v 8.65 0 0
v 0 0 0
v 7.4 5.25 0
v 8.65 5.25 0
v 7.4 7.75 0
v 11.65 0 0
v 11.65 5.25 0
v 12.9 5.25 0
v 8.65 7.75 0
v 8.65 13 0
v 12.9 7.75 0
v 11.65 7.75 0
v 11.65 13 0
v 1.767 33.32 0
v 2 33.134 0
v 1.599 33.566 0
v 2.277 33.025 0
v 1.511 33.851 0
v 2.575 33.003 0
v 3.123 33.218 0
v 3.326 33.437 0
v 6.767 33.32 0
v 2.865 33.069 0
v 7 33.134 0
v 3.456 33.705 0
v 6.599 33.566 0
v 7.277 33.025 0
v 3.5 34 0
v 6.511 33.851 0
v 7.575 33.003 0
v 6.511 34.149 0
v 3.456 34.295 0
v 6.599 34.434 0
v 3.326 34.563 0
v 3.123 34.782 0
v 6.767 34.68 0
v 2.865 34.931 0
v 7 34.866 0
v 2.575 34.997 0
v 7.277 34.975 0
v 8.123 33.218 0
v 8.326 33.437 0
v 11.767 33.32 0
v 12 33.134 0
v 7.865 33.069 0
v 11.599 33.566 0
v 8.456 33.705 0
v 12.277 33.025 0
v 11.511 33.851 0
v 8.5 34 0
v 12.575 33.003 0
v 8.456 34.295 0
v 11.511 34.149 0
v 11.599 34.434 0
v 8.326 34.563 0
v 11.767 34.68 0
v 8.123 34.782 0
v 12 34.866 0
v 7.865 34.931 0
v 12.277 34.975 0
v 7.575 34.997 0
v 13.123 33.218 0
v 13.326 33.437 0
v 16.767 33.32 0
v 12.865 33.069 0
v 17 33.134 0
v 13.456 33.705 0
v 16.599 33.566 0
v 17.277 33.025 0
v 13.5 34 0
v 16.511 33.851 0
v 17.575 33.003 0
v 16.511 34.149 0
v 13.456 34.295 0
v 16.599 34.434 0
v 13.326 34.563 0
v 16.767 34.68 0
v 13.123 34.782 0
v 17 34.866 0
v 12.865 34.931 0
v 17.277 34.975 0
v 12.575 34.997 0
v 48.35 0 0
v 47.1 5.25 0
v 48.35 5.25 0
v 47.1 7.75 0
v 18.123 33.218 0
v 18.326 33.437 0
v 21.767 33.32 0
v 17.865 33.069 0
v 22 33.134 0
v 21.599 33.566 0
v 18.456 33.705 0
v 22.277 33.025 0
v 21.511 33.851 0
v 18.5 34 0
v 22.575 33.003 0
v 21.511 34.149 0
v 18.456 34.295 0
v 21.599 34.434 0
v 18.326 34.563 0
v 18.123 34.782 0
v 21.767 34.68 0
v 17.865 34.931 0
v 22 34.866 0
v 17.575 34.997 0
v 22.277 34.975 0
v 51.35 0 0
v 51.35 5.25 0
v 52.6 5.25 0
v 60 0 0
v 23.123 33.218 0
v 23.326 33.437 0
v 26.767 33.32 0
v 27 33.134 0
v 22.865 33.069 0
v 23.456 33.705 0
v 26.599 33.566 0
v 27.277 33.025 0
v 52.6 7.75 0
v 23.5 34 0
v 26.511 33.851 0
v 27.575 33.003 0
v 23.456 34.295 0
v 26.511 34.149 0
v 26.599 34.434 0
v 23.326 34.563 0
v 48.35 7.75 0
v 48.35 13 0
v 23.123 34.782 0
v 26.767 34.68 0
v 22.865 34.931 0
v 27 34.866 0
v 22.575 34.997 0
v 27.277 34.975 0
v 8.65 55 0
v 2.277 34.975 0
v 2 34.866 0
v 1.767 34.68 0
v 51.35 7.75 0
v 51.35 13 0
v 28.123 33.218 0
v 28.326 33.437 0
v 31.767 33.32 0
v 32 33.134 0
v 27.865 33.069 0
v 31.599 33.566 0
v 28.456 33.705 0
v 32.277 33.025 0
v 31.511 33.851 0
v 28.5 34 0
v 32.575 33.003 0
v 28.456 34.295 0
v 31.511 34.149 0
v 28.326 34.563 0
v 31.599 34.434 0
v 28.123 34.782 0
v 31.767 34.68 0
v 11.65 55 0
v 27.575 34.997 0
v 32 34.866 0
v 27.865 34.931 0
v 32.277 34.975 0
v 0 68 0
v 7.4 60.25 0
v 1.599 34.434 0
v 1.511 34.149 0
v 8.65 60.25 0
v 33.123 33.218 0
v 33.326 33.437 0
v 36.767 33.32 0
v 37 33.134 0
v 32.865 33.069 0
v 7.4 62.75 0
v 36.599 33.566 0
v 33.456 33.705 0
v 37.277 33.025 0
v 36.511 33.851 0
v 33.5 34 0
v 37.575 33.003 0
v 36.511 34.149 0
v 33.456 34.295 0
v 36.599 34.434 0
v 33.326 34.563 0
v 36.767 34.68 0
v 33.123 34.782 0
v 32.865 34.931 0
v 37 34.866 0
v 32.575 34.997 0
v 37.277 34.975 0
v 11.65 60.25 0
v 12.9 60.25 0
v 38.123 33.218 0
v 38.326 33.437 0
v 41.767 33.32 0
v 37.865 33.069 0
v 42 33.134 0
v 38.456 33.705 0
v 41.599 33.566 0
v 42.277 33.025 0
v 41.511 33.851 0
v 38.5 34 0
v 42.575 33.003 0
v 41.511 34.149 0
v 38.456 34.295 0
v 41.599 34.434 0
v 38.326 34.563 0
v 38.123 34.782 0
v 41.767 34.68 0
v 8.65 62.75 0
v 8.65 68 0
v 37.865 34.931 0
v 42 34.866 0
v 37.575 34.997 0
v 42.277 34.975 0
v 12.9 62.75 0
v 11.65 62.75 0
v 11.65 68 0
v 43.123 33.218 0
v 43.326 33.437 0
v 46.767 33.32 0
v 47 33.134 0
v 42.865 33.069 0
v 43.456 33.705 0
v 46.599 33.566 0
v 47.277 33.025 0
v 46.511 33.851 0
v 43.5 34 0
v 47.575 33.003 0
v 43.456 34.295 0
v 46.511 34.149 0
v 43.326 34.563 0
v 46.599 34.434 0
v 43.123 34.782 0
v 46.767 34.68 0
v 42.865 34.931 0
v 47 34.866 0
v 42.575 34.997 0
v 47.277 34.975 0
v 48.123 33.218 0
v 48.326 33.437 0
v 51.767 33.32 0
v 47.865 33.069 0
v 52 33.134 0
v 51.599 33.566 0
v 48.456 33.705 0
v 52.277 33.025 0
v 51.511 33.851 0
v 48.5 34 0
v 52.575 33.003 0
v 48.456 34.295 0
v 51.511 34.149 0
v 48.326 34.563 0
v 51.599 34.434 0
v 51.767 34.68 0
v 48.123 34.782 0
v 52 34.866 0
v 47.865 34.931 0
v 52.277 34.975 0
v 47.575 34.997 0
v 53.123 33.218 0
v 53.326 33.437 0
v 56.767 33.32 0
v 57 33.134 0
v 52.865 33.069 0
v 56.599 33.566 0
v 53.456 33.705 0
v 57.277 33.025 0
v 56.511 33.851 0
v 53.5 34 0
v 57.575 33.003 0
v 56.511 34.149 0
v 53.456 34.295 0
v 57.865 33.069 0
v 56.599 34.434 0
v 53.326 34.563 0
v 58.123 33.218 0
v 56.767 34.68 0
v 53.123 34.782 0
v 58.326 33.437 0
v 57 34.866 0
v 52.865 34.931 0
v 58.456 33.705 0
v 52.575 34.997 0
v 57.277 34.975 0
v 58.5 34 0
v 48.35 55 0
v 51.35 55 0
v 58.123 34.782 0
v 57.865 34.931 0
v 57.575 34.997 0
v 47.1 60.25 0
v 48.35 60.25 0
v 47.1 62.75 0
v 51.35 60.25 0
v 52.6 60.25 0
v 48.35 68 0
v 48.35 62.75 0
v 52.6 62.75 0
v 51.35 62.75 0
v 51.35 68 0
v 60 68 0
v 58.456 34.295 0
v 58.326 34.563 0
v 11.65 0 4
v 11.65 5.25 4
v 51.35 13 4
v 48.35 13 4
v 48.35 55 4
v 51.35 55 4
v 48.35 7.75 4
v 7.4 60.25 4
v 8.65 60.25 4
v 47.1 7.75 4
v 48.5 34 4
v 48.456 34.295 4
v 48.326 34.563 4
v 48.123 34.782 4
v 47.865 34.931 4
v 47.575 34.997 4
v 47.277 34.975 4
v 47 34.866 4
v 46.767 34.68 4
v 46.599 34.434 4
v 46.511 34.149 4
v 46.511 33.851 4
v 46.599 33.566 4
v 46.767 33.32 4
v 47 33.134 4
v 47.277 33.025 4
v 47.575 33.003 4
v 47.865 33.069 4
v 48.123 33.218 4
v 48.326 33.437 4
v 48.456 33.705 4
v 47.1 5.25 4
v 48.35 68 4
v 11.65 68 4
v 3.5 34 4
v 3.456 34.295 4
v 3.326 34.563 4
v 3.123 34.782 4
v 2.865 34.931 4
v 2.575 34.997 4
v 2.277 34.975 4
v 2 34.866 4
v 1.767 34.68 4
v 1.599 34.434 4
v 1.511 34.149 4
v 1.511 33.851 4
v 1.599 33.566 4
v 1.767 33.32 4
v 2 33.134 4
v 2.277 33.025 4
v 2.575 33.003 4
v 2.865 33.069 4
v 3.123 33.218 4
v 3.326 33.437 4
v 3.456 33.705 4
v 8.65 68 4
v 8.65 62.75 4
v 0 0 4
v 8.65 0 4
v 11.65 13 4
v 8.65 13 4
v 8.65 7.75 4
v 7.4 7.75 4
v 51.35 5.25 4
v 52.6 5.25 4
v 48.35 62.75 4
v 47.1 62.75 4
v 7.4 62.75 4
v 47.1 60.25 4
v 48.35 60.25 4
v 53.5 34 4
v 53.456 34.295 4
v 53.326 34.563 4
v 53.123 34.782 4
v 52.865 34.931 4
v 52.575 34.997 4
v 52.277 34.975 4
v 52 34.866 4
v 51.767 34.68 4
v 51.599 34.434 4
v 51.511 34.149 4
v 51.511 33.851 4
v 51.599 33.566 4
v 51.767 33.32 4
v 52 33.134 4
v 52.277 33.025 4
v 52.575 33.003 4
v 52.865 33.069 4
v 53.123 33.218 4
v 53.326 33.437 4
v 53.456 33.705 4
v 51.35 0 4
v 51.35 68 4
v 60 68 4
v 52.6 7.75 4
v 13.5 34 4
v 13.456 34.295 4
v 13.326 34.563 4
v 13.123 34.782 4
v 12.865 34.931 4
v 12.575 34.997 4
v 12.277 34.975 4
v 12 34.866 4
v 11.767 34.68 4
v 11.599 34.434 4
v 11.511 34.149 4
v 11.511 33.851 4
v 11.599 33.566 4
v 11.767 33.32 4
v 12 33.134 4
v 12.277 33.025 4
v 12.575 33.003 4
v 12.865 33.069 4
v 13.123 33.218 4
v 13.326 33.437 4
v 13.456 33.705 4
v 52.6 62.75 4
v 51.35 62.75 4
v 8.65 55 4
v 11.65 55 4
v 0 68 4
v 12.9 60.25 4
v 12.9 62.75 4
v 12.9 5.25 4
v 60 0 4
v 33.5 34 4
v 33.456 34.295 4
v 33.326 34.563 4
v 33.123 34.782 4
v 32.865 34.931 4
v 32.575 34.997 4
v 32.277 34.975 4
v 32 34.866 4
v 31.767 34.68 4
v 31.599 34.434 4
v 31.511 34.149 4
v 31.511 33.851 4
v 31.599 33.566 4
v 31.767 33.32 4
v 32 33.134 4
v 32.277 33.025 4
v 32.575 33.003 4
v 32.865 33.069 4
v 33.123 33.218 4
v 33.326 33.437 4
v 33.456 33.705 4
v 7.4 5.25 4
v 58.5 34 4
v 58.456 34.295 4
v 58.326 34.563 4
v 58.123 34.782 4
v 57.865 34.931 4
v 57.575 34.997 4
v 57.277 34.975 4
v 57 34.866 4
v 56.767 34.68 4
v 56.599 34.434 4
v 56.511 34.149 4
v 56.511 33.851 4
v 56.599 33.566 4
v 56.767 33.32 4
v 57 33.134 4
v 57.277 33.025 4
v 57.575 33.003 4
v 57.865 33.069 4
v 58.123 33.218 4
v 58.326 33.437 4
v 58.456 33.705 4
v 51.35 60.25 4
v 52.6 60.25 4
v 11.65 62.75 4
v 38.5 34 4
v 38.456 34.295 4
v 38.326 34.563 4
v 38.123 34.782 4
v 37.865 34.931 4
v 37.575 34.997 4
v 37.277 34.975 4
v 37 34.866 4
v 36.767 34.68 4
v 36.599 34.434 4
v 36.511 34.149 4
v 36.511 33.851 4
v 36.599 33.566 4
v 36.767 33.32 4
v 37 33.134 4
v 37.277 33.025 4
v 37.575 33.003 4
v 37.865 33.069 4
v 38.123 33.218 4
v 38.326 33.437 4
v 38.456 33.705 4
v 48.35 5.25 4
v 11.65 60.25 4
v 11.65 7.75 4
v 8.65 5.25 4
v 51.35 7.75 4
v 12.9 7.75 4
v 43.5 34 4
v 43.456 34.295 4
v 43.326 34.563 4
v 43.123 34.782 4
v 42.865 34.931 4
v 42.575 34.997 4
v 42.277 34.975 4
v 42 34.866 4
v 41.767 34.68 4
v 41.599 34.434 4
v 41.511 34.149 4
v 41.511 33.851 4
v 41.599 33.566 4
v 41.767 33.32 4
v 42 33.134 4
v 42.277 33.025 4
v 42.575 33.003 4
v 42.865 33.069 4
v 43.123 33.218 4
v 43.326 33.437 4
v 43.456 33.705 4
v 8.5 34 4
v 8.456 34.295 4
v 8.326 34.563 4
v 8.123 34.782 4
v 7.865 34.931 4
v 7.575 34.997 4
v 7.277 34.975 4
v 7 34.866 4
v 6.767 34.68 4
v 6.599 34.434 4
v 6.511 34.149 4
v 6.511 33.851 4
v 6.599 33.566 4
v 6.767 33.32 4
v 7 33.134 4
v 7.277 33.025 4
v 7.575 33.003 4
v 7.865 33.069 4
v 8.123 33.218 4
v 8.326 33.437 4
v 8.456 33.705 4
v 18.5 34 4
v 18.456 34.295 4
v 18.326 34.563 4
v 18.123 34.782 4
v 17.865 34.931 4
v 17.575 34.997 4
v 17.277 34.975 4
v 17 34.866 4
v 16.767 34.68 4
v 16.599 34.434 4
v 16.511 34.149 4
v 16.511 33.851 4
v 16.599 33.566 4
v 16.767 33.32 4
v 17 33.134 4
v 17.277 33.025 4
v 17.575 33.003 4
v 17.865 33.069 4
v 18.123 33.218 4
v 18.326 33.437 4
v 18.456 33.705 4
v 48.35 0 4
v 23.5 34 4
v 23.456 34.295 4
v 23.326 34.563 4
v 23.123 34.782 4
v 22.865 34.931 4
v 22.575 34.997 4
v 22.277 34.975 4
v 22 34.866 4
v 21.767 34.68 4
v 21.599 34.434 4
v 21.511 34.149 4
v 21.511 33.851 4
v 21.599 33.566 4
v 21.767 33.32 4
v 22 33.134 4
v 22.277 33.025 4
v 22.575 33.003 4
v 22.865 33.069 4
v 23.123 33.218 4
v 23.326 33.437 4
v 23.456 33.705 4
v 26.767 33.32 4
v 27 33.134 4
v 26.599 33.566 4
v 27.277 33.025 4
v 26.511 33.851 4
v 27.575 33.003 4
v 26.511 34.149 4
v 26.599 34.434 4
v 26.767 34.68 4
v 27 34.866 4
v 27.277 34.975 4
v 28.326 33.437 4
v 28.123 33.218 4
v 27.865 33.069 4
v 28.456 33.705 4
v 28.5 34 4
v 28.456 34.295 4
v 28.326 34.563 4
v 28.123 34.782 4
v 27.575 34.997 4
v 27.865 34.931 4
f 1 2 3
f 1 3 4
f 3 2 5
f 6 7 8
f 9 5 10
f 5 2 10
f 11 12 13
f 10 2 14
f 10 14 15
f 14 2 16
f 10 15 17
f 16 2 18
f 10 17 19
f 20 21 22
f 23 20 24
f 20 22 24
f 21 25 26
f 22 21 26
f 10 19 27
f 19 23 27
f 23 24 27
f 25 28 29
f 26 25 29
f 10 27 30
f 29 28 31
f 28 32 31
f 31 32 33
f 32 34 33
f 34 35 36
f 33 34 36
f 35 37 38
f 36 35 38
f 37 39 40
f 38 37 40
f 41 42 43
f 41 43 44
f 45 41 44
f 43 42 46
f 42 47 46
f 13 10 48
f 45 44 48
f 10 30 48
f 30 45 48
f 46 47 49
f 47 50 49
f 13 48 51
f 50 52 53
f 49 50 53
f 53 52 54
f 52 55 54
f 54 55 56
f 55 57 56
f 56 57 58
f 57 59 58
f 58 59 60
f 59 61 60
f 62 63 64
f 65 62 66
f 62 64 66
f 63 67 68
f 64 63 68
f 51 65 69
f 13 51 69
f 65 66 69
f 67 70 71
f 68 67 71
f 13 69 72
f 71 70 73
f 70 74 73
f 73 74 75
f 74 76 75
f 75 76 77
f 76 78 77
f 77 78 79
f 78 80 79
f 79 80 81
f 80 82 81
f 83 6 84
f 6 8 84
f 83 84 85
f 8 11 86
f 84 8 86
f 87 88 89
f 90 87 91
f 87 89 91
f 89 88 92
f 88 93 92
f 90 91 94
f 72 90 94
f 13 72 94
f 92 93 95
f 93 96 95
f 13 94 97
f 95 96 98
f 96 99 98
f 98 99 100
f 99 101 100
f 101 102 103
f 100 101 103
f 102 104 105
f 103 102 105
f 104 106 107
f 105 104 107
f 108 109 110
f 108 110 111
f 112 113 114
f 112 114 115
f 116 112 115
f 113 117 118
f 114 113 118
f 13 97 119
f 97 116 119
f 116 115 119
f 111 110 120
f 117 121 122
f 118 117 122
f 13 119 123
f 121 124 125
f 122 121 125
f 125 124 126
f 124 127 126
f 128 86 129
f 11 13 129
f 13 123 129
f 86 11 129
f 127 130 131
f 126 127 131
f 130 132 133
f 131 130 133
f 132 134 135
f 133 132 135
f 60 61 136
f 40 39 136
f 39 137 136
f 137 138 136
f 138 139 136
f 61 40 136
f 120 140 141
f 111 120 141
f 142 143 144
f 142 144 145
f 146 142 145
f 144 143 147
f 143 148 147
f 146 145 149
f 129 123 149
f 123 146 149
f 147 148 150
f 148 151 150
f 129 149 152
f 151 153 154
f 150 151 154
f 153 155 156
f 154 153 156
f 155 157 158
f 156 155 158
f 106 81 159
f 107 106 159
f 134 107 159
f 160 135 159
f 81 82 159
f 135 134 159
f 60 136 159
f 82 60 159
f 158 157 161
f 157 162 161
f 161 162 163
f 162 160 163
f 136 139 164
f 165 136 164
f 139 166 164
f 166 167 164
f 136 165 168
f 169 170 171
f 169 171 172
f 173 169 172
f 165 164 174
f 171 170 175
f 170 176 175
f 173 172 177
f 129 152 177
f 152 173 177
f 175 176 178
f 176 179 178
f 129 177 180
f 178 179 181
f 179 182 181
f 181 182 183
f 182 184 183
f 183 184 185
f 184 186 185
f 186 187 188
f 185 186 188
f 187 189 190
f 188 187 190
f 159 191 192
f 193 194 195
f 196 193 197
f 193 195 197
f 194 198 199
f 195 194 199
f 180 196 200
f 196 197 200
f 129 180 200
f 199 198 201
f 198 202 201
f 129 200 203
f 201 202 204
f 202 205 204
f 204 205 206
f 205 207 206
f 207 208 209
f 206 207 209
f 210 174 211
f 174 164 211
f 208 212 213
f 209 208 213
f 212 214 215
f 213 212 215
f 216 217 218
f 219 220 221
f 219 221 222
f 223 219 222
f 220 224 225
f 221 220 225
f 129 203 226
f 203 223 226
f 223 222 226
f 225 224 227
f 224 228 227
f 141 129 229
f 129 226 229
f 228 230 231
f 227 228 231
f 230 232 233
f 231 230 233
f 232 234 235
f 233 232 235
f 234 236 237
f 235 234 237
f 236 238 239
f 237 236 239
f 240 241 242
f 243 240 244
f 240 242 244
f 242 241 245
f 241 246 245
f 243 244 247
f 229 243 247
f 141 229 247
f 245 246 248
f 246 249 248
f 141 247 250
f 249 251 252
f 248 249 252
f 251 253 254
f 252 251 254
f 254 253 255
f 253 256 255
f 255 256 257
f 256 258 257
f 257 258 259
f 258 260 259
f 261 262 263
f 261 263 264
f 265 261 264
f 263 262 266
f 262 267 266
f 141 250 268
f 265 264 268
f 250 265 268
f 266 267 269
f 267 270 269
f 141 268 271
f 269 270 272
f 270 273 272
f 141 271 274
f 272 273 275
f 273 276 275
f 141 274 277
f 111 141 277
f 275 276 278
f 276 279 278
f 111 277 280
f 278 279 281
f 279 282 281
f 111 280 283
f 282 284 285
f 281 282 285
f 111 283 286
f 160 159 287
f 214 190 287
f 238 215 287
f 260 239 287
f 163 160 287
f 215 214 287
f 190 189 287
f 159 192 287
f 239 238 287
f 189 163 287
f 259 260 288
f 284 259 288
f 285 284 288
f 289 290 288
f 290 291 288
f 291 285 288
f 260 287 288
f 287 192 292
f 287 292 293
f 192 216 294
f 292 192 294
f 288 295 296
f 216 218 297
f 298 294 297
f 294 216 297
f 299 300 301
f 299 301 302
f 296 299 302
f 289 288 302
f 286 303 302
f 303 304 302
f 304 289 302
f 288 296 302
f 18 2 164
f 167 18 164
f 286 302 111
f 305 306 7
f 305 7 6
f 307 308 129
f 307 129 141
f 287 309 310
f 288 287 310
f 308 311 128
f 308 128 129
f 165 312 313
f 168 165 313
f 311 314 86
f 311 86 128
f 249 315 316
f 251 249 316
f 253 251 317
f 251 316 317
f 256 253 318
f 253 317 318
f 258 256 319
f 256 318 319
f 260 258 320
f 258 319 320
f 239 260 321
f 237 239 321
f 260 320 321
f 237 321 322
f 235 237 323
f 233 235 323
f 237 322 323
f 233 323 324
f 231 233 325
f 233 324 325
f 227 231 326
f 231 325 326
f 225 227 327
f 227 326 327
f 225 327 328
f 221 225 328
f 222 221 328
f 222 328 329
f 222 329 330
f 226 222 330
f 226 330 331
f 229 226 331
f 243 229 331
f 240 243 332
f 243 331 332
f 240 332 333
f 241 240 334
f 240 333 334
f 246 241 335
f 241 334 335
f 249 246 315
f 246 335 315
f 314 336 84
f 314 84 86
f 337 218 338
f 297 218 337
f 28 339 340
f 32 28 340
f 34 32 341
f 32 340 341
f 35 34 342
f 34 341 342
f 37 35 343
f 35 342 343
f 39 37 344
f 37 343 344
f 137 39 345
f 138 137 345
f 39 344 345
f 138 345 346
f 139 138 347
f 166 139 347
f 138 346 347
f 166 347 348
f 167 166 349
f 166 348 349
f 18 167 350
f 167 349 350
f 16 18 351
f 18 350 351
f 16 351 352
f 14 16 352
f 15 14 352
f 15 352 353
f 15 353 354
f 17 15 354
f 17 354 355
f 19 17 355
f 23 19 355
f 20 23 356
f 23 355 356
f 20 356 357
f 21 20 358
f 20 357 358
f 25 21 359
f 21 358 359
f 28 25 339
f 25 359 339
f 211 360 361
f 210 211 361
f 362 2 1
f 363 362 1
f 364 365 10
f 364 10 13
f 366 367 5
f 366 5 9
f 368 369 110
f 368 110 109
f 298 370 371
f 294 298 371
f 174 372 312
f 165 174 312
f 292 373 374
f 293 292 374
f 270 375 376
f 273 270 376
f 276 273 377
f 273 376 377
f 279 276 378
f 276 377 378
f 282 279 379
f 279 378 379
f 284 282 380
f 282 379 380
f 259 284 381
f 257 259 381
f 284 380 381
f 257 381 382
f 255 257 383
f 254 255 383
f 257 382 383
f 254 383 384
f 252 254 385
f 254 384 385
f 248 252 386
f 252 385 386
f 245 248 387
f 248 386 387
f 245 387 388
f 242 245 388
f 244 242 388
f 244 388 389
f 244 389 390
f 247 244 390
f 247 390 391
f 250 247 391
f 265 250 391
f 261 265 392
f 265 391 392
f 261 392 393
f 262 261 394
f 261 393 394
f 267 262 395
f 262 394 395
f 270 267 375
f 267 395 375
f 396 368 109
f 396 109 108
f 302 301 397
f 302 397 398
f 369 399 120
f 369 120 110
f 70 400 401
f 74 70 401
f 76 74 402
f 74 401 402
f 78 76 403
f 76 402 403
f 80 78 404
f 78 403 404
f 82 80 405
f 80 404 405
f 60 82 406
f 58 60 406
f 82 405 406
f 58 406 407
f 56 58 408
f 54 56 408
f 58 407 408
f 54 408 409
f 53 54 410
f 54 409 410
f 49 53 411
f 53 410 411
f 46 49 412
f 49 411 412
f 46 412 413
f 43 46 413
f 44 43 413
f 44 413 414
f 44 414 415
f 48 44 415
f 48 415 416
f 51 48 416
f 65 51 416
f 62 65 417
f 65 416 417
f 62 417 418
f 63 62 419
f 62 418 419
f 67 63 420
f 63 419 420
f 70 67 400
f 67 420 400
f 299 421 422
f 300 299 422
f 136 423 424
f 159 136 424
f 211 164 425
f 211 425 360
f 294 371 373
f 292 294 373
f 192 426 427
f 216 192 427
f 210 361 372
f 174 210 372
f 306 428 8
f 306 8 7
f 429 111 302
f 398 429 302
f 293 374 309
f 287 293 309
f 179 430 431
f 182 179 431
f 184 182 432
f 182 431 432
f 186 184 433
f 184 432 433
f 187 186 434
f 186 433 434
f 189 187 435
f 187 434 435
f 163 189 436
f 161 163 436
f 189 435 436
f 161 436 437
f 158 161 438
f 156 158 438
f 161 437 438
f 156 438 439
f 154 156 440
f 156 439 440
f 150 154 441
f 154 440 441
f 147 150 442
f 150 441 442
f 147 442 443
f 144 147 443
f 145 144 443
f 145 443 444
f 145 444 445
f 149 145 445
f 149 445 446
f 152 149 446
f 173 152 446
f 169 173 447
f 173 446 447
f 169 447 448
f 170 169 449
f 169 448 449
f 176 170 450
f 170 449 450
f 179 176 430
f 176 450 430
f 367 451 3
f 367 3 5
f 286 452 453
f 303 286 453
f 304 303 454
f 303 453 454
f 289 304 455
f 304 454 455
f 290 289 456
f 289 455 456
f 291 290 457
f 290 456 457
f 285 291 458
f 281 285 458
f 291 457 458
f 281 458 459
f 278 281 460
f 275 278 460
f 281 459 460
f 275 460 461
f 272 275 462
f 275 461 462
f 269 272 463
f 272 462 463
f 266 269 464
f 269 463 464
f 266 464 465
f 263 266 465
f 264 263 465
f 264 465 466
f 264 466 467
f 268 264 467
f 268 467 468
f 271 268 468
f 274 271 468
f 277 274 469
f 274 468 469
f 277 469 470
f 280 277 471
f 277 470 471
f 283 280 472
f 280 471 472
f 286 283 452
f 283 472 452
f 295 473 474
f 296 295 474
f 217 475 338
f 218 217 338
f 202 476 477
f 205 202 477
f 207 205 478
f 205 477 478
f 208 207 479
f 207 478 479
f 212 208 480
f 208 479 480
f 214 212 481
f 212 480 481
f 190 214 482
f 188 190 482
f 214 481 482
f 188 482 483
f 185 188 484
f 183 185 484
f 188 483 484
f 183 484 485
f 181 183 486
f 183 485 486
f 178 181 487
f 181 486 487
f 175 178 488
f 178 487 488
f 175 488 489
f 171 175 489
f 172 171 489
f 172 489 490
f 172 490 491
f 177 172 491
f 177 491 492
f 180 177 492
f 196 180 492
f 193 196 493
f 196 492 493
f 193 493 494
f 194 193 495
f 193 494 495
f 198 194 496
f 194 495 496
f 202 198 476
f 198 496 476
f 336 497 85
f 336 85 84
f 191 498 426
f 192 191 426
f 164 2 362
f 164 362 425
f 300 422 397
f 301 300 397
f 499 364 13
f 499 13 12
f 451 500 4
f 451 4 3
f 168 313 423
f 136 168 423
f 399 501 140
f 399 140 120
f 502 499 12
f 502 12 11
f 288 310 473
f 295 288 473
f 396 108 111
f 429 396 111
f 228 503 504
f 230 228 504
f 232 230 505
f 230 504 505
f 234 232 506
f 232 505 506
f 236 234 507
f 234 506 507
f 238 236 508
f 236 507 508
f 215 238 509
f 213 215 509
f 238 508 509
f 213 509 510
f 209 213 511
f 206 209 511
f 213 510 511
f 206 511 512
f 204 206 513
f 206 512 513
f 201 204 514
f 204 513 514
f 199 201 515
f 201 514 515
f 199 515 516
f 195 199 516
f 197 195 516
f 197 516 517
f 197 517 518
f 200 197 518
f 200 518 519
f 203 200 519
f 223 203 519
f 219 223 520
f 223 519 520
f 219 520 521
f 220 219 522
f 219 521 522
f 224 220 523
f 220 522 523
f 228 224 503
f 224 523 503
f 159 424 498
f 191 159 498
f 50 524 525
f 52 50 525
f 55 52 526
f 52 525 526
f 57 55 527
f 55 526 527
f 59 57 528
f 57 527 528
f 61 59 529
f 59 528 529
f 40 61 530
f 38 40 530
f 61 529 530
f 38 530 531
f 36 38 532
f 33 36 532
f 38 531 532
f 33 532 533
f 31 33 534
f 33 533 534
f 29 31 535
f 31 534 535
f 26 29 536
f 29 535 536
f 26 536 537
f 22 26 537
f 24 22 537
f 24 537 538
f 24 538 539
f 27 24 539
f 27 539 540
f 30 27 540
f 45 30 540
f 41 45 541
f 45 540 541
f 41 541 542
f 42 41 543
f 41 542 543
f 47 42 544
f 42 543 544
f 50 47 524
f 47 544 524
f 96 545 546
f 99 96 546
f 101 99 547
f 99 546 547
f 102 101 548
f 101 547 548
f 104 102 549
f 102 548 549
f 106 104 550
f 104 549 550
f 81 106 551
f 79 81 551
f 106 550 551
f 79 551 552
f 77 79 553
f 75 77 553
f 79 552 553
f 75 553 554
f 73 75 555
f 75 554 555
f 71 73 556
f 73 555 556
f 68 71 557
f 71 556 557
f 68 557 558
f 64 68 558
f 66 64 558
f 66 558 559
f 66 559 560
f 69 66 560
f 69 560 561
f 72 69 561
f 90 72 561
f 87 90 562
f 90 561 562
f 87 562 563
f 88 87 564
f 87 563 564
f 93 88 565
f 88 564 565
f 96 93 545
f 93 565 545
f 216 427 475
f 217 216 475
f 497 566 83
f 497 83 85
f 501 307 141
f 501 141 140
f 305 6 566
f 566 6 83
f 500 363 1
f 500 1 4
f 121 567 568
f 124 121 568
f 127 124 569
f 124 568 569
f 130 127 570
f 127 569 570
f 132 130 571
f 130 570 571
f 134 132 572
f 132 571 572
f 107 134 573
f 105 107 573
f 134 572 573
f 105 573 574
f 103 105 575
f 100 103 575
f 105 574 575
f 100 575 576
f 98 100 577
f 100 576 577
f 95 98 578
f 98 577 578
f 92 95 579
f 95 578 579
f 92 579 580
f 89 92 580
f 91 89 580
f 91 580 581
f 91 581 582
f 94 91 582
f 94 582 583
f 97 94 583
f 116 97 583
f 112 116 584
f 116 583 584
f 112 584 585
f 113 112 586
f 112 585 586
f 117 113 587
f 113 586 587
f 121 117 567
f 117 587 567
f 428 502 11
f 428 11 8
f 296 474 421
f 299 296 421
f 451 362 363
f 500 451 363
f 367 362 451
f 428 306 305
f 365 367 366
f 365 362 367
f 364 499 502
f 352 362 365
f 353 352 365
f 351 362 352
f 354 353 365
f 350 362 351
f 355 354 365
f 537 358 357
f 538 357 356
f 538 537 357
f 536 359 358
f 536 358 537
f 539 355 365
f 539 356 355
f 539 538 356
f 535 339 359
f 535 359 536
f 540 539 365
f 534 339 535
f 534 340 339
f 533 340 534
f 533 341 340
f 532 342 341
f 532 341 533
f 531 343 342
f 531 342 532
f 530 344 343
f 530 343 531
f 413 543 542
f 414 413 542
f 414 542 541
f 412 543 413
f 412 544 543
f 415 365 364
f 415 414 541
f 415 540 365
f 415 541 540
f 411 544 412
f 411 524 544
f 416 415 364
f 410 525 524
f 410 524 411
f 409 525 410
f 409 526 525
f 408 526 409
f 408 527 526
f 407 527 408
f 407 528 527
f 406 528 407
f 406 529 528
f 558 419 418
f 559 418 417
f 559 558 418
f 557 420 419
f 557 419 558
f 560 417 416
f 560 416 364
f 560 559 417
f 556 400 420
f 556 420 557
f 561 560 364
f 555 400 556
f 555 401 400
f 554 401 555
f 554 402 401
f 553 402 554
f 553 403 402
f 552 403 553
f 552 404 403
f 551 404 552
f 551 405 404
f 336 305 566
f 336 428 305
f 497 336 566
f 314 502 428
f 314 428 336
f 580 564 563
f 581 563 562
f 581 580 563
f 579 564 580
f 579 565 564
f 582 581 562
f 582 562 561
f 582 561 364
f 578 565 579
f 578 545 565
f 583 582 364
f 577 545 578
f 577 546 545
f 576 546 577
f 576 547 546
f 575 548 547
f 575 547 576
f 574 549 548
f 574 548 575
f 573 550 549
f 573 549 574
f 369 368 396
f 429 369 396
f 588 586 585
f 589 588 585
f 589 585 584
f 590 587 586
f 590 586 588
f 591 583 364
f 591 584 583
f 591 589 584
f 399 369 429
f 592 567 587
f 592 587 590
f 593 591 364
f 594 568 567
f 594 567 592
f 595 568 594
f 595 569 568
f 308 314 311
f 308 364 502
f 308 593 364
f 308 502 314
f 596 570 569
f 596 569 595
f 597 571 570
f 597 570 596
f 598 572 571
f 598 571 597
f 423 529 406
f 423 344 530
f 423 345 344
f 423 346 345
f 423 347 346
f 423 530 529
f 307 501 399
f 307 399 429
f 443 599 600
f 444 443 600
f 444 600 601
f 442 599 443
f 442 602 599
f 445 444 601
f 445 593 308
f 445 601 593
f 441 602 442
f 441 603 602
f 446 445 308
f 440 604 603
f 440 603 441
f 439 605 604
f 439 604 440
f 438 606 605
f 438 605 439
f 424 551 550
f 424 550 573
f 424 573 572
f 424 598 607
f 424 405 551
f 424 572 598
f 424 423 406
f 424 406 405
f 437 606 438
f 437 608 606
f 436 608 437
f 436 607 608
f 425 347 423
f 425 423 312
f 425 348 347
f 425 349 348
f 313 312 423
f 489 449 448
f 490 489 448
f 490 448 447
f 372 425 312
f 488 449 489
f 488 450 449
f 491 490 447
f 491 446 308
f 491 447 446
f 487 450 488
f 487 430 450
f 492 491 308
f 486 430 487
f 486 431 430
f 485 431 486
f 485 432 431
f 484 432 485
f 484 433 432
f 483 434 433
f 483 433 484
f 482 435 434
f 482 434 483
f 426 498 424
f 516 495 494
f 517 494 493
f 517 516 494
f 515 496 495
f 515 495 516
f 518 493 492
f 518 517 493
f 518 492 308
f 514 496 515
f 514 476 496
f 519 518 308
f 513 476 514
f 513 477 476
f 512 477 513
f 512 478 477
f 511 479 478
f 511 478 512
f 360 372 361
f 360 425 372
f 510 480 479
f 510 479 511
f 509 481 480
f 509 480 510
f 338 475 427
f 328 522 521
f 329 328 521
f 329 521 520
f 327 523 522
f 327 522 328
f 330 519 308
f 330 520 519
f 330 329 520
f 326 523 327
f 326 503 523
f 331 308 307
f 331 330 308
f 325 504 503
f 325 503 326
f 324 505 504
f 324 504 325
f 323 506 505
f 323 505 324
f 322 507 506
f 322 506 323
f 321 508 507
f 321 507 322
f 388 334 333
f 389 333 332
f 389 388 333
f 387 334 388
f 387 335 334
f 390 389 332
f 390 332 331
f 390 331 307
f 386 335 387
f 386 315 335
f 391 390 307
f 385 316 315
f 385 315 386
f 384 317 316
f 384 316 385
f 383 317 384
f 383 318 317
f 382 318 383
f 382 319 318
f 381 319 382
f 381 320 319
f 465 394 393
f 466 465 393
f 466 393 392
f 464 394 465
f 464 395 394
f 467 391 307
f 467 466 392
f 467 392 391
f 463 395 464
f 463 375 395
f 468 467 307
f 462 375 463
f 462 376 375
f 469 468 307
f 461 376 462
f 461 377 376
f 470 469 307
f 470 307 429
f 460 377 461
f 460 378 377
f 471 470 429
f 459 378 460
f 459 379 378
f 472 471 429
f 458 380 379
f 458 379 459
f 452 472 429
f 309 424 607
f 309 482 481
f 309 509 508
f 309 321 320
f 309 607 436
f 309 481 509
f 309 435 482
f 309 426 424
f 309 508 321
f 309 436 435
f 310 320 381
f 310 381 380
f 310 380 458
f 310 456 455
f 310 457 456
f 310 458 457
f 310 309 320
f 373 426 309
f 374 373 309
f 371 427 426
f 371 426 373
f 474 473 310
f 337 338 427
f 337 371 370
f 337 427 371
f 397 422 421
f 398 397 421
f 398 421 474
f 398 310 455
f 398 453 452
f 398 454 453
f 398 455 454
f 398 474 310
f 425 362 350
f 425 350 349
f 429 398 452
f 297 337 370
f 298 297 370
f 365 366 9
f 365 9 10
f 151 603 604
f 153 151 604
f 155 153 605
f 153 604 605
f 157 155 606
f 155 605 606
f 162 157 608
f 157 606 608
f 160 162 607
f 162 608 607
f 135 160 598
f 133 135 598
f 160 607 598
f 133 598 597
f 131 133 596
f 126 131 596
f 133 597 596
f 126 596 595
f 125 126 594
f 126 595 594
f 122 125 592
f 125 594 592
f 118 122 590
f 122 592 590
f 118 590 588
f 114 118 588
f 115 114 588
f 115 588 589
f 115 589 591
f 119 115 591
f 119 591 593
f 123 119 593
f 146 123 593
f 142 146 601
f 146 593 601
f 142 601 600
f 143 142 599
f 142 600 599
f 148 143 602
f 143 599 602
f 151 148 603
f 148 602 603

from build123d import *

# Parameters (mm, degrees)
SKETCH_2_W          = 60
SKETCH_2_H          = 68
EXTRUDE_1_DEPTH     = 4
CUT_EXTRUDE_1_DEPTH = 4
SKETCH_4_R          = 1
CUT_EXTRUDE_2_DEPTH = 4


with BuildPart() as part:
    # Эскиз2 → Бобышка-Вытянуть1 (new body)
    with BuildSketch(Plane.XY):
        with Locations((30, 34)):
            Rectangle(SKETCH_2_W, SKETCH_2_H)
    extrude(amount=EXTRUDE_1_DEPTH)

    # Эскиз3 → Вырез-Вытянуть1 (cut)
    with BuildSketch(Plane.XY.offset(4)):
        Polygon((8.65, 0), (8.65, 5.25), (7.4, 5.25), (7.4, 7.75), (8.65, 7.75), (8.65, 13), (11.65, 13), (11.65, 7.75), (12.9, 7.75), (12.9, 5.25), (11.65, 5.25), (11.65, 0), align=None)
        Polygon((47.1, 7.75), (48.35, 7.75), (48.35, 13), (51.35, 13), (51.35, 7.75), (52.6, 7.75), (52.6, 5.25), (51.35, 5.25), (51.35, 0), (48.35, 0), (48.35, 5.25), (47.1, 5.25), align=None)
        Polygon((48.35, 68), (48.35, 62.75), (47.1, 62.75), (47.1, 60.25), (48.35, 60.25), (48.35, 55), (51.35, 55), (51.35, 60.25), (52.6, 60.25), (52.6, 62.75), (51.35, 62.75), (51.35, 68), align=None)
        Polygon((8.65, 68), (8.65, 62.75), (7.4, 62.75), (7.4, 60.25), (8.65, 60.25), (8.65, 55), (11.65, 55), (11.65, 60.25), (12.9, 60.25), (12.9, 62.75), (11.65, 62.75), (11.65, 68), align=None)
    extrude(amount=-CUT_EXTRUDE_1_DEPTH, mode=Mode.SUBTRACT)

    # Эскиз4 → Вырез-Вытянуть2 (cut)
    with BuildSketch(Plane.XY.offset(4)):
        with Locations((2.5, 34)):
            Circle(SKETCH_4_R)
        with Locations((7.5, 34)):
            Circle(SKETCH_4_R)
        with Locations((12.5, 34)):
            Circle(SKETCH_4_R)
        with Locations((17.5, 34)):
            Circle(SKETCH_4_R)
        with Locations((22.5, 34)):
            Circle(SKETCH_4_R)
        with Locations((27.5, 34)):
            Circle(SKETCH_4_R)
        with Locations((32.5, 34)):
            Circle(SKETCH_4_R)
        with Locations((37.5, 34)):
            Circle(SKETCH_4_R)
        with Locations((42.5, 34)):
            Circle(SKETCH_4_R)
        with Locations((47.5, 34)):
            Circle(SKETCH_4_R)
        with Locations((52.5, 34)):
            Circle(SKETCH_4_R)
        with Locations((57.5, 34)):
            Circle(SKETCH_4_R)
    extrude(amount=-CUT_EXTRUDE_2_DEPTH, mode=Mode.SUBTRACT)


solid = part.part
